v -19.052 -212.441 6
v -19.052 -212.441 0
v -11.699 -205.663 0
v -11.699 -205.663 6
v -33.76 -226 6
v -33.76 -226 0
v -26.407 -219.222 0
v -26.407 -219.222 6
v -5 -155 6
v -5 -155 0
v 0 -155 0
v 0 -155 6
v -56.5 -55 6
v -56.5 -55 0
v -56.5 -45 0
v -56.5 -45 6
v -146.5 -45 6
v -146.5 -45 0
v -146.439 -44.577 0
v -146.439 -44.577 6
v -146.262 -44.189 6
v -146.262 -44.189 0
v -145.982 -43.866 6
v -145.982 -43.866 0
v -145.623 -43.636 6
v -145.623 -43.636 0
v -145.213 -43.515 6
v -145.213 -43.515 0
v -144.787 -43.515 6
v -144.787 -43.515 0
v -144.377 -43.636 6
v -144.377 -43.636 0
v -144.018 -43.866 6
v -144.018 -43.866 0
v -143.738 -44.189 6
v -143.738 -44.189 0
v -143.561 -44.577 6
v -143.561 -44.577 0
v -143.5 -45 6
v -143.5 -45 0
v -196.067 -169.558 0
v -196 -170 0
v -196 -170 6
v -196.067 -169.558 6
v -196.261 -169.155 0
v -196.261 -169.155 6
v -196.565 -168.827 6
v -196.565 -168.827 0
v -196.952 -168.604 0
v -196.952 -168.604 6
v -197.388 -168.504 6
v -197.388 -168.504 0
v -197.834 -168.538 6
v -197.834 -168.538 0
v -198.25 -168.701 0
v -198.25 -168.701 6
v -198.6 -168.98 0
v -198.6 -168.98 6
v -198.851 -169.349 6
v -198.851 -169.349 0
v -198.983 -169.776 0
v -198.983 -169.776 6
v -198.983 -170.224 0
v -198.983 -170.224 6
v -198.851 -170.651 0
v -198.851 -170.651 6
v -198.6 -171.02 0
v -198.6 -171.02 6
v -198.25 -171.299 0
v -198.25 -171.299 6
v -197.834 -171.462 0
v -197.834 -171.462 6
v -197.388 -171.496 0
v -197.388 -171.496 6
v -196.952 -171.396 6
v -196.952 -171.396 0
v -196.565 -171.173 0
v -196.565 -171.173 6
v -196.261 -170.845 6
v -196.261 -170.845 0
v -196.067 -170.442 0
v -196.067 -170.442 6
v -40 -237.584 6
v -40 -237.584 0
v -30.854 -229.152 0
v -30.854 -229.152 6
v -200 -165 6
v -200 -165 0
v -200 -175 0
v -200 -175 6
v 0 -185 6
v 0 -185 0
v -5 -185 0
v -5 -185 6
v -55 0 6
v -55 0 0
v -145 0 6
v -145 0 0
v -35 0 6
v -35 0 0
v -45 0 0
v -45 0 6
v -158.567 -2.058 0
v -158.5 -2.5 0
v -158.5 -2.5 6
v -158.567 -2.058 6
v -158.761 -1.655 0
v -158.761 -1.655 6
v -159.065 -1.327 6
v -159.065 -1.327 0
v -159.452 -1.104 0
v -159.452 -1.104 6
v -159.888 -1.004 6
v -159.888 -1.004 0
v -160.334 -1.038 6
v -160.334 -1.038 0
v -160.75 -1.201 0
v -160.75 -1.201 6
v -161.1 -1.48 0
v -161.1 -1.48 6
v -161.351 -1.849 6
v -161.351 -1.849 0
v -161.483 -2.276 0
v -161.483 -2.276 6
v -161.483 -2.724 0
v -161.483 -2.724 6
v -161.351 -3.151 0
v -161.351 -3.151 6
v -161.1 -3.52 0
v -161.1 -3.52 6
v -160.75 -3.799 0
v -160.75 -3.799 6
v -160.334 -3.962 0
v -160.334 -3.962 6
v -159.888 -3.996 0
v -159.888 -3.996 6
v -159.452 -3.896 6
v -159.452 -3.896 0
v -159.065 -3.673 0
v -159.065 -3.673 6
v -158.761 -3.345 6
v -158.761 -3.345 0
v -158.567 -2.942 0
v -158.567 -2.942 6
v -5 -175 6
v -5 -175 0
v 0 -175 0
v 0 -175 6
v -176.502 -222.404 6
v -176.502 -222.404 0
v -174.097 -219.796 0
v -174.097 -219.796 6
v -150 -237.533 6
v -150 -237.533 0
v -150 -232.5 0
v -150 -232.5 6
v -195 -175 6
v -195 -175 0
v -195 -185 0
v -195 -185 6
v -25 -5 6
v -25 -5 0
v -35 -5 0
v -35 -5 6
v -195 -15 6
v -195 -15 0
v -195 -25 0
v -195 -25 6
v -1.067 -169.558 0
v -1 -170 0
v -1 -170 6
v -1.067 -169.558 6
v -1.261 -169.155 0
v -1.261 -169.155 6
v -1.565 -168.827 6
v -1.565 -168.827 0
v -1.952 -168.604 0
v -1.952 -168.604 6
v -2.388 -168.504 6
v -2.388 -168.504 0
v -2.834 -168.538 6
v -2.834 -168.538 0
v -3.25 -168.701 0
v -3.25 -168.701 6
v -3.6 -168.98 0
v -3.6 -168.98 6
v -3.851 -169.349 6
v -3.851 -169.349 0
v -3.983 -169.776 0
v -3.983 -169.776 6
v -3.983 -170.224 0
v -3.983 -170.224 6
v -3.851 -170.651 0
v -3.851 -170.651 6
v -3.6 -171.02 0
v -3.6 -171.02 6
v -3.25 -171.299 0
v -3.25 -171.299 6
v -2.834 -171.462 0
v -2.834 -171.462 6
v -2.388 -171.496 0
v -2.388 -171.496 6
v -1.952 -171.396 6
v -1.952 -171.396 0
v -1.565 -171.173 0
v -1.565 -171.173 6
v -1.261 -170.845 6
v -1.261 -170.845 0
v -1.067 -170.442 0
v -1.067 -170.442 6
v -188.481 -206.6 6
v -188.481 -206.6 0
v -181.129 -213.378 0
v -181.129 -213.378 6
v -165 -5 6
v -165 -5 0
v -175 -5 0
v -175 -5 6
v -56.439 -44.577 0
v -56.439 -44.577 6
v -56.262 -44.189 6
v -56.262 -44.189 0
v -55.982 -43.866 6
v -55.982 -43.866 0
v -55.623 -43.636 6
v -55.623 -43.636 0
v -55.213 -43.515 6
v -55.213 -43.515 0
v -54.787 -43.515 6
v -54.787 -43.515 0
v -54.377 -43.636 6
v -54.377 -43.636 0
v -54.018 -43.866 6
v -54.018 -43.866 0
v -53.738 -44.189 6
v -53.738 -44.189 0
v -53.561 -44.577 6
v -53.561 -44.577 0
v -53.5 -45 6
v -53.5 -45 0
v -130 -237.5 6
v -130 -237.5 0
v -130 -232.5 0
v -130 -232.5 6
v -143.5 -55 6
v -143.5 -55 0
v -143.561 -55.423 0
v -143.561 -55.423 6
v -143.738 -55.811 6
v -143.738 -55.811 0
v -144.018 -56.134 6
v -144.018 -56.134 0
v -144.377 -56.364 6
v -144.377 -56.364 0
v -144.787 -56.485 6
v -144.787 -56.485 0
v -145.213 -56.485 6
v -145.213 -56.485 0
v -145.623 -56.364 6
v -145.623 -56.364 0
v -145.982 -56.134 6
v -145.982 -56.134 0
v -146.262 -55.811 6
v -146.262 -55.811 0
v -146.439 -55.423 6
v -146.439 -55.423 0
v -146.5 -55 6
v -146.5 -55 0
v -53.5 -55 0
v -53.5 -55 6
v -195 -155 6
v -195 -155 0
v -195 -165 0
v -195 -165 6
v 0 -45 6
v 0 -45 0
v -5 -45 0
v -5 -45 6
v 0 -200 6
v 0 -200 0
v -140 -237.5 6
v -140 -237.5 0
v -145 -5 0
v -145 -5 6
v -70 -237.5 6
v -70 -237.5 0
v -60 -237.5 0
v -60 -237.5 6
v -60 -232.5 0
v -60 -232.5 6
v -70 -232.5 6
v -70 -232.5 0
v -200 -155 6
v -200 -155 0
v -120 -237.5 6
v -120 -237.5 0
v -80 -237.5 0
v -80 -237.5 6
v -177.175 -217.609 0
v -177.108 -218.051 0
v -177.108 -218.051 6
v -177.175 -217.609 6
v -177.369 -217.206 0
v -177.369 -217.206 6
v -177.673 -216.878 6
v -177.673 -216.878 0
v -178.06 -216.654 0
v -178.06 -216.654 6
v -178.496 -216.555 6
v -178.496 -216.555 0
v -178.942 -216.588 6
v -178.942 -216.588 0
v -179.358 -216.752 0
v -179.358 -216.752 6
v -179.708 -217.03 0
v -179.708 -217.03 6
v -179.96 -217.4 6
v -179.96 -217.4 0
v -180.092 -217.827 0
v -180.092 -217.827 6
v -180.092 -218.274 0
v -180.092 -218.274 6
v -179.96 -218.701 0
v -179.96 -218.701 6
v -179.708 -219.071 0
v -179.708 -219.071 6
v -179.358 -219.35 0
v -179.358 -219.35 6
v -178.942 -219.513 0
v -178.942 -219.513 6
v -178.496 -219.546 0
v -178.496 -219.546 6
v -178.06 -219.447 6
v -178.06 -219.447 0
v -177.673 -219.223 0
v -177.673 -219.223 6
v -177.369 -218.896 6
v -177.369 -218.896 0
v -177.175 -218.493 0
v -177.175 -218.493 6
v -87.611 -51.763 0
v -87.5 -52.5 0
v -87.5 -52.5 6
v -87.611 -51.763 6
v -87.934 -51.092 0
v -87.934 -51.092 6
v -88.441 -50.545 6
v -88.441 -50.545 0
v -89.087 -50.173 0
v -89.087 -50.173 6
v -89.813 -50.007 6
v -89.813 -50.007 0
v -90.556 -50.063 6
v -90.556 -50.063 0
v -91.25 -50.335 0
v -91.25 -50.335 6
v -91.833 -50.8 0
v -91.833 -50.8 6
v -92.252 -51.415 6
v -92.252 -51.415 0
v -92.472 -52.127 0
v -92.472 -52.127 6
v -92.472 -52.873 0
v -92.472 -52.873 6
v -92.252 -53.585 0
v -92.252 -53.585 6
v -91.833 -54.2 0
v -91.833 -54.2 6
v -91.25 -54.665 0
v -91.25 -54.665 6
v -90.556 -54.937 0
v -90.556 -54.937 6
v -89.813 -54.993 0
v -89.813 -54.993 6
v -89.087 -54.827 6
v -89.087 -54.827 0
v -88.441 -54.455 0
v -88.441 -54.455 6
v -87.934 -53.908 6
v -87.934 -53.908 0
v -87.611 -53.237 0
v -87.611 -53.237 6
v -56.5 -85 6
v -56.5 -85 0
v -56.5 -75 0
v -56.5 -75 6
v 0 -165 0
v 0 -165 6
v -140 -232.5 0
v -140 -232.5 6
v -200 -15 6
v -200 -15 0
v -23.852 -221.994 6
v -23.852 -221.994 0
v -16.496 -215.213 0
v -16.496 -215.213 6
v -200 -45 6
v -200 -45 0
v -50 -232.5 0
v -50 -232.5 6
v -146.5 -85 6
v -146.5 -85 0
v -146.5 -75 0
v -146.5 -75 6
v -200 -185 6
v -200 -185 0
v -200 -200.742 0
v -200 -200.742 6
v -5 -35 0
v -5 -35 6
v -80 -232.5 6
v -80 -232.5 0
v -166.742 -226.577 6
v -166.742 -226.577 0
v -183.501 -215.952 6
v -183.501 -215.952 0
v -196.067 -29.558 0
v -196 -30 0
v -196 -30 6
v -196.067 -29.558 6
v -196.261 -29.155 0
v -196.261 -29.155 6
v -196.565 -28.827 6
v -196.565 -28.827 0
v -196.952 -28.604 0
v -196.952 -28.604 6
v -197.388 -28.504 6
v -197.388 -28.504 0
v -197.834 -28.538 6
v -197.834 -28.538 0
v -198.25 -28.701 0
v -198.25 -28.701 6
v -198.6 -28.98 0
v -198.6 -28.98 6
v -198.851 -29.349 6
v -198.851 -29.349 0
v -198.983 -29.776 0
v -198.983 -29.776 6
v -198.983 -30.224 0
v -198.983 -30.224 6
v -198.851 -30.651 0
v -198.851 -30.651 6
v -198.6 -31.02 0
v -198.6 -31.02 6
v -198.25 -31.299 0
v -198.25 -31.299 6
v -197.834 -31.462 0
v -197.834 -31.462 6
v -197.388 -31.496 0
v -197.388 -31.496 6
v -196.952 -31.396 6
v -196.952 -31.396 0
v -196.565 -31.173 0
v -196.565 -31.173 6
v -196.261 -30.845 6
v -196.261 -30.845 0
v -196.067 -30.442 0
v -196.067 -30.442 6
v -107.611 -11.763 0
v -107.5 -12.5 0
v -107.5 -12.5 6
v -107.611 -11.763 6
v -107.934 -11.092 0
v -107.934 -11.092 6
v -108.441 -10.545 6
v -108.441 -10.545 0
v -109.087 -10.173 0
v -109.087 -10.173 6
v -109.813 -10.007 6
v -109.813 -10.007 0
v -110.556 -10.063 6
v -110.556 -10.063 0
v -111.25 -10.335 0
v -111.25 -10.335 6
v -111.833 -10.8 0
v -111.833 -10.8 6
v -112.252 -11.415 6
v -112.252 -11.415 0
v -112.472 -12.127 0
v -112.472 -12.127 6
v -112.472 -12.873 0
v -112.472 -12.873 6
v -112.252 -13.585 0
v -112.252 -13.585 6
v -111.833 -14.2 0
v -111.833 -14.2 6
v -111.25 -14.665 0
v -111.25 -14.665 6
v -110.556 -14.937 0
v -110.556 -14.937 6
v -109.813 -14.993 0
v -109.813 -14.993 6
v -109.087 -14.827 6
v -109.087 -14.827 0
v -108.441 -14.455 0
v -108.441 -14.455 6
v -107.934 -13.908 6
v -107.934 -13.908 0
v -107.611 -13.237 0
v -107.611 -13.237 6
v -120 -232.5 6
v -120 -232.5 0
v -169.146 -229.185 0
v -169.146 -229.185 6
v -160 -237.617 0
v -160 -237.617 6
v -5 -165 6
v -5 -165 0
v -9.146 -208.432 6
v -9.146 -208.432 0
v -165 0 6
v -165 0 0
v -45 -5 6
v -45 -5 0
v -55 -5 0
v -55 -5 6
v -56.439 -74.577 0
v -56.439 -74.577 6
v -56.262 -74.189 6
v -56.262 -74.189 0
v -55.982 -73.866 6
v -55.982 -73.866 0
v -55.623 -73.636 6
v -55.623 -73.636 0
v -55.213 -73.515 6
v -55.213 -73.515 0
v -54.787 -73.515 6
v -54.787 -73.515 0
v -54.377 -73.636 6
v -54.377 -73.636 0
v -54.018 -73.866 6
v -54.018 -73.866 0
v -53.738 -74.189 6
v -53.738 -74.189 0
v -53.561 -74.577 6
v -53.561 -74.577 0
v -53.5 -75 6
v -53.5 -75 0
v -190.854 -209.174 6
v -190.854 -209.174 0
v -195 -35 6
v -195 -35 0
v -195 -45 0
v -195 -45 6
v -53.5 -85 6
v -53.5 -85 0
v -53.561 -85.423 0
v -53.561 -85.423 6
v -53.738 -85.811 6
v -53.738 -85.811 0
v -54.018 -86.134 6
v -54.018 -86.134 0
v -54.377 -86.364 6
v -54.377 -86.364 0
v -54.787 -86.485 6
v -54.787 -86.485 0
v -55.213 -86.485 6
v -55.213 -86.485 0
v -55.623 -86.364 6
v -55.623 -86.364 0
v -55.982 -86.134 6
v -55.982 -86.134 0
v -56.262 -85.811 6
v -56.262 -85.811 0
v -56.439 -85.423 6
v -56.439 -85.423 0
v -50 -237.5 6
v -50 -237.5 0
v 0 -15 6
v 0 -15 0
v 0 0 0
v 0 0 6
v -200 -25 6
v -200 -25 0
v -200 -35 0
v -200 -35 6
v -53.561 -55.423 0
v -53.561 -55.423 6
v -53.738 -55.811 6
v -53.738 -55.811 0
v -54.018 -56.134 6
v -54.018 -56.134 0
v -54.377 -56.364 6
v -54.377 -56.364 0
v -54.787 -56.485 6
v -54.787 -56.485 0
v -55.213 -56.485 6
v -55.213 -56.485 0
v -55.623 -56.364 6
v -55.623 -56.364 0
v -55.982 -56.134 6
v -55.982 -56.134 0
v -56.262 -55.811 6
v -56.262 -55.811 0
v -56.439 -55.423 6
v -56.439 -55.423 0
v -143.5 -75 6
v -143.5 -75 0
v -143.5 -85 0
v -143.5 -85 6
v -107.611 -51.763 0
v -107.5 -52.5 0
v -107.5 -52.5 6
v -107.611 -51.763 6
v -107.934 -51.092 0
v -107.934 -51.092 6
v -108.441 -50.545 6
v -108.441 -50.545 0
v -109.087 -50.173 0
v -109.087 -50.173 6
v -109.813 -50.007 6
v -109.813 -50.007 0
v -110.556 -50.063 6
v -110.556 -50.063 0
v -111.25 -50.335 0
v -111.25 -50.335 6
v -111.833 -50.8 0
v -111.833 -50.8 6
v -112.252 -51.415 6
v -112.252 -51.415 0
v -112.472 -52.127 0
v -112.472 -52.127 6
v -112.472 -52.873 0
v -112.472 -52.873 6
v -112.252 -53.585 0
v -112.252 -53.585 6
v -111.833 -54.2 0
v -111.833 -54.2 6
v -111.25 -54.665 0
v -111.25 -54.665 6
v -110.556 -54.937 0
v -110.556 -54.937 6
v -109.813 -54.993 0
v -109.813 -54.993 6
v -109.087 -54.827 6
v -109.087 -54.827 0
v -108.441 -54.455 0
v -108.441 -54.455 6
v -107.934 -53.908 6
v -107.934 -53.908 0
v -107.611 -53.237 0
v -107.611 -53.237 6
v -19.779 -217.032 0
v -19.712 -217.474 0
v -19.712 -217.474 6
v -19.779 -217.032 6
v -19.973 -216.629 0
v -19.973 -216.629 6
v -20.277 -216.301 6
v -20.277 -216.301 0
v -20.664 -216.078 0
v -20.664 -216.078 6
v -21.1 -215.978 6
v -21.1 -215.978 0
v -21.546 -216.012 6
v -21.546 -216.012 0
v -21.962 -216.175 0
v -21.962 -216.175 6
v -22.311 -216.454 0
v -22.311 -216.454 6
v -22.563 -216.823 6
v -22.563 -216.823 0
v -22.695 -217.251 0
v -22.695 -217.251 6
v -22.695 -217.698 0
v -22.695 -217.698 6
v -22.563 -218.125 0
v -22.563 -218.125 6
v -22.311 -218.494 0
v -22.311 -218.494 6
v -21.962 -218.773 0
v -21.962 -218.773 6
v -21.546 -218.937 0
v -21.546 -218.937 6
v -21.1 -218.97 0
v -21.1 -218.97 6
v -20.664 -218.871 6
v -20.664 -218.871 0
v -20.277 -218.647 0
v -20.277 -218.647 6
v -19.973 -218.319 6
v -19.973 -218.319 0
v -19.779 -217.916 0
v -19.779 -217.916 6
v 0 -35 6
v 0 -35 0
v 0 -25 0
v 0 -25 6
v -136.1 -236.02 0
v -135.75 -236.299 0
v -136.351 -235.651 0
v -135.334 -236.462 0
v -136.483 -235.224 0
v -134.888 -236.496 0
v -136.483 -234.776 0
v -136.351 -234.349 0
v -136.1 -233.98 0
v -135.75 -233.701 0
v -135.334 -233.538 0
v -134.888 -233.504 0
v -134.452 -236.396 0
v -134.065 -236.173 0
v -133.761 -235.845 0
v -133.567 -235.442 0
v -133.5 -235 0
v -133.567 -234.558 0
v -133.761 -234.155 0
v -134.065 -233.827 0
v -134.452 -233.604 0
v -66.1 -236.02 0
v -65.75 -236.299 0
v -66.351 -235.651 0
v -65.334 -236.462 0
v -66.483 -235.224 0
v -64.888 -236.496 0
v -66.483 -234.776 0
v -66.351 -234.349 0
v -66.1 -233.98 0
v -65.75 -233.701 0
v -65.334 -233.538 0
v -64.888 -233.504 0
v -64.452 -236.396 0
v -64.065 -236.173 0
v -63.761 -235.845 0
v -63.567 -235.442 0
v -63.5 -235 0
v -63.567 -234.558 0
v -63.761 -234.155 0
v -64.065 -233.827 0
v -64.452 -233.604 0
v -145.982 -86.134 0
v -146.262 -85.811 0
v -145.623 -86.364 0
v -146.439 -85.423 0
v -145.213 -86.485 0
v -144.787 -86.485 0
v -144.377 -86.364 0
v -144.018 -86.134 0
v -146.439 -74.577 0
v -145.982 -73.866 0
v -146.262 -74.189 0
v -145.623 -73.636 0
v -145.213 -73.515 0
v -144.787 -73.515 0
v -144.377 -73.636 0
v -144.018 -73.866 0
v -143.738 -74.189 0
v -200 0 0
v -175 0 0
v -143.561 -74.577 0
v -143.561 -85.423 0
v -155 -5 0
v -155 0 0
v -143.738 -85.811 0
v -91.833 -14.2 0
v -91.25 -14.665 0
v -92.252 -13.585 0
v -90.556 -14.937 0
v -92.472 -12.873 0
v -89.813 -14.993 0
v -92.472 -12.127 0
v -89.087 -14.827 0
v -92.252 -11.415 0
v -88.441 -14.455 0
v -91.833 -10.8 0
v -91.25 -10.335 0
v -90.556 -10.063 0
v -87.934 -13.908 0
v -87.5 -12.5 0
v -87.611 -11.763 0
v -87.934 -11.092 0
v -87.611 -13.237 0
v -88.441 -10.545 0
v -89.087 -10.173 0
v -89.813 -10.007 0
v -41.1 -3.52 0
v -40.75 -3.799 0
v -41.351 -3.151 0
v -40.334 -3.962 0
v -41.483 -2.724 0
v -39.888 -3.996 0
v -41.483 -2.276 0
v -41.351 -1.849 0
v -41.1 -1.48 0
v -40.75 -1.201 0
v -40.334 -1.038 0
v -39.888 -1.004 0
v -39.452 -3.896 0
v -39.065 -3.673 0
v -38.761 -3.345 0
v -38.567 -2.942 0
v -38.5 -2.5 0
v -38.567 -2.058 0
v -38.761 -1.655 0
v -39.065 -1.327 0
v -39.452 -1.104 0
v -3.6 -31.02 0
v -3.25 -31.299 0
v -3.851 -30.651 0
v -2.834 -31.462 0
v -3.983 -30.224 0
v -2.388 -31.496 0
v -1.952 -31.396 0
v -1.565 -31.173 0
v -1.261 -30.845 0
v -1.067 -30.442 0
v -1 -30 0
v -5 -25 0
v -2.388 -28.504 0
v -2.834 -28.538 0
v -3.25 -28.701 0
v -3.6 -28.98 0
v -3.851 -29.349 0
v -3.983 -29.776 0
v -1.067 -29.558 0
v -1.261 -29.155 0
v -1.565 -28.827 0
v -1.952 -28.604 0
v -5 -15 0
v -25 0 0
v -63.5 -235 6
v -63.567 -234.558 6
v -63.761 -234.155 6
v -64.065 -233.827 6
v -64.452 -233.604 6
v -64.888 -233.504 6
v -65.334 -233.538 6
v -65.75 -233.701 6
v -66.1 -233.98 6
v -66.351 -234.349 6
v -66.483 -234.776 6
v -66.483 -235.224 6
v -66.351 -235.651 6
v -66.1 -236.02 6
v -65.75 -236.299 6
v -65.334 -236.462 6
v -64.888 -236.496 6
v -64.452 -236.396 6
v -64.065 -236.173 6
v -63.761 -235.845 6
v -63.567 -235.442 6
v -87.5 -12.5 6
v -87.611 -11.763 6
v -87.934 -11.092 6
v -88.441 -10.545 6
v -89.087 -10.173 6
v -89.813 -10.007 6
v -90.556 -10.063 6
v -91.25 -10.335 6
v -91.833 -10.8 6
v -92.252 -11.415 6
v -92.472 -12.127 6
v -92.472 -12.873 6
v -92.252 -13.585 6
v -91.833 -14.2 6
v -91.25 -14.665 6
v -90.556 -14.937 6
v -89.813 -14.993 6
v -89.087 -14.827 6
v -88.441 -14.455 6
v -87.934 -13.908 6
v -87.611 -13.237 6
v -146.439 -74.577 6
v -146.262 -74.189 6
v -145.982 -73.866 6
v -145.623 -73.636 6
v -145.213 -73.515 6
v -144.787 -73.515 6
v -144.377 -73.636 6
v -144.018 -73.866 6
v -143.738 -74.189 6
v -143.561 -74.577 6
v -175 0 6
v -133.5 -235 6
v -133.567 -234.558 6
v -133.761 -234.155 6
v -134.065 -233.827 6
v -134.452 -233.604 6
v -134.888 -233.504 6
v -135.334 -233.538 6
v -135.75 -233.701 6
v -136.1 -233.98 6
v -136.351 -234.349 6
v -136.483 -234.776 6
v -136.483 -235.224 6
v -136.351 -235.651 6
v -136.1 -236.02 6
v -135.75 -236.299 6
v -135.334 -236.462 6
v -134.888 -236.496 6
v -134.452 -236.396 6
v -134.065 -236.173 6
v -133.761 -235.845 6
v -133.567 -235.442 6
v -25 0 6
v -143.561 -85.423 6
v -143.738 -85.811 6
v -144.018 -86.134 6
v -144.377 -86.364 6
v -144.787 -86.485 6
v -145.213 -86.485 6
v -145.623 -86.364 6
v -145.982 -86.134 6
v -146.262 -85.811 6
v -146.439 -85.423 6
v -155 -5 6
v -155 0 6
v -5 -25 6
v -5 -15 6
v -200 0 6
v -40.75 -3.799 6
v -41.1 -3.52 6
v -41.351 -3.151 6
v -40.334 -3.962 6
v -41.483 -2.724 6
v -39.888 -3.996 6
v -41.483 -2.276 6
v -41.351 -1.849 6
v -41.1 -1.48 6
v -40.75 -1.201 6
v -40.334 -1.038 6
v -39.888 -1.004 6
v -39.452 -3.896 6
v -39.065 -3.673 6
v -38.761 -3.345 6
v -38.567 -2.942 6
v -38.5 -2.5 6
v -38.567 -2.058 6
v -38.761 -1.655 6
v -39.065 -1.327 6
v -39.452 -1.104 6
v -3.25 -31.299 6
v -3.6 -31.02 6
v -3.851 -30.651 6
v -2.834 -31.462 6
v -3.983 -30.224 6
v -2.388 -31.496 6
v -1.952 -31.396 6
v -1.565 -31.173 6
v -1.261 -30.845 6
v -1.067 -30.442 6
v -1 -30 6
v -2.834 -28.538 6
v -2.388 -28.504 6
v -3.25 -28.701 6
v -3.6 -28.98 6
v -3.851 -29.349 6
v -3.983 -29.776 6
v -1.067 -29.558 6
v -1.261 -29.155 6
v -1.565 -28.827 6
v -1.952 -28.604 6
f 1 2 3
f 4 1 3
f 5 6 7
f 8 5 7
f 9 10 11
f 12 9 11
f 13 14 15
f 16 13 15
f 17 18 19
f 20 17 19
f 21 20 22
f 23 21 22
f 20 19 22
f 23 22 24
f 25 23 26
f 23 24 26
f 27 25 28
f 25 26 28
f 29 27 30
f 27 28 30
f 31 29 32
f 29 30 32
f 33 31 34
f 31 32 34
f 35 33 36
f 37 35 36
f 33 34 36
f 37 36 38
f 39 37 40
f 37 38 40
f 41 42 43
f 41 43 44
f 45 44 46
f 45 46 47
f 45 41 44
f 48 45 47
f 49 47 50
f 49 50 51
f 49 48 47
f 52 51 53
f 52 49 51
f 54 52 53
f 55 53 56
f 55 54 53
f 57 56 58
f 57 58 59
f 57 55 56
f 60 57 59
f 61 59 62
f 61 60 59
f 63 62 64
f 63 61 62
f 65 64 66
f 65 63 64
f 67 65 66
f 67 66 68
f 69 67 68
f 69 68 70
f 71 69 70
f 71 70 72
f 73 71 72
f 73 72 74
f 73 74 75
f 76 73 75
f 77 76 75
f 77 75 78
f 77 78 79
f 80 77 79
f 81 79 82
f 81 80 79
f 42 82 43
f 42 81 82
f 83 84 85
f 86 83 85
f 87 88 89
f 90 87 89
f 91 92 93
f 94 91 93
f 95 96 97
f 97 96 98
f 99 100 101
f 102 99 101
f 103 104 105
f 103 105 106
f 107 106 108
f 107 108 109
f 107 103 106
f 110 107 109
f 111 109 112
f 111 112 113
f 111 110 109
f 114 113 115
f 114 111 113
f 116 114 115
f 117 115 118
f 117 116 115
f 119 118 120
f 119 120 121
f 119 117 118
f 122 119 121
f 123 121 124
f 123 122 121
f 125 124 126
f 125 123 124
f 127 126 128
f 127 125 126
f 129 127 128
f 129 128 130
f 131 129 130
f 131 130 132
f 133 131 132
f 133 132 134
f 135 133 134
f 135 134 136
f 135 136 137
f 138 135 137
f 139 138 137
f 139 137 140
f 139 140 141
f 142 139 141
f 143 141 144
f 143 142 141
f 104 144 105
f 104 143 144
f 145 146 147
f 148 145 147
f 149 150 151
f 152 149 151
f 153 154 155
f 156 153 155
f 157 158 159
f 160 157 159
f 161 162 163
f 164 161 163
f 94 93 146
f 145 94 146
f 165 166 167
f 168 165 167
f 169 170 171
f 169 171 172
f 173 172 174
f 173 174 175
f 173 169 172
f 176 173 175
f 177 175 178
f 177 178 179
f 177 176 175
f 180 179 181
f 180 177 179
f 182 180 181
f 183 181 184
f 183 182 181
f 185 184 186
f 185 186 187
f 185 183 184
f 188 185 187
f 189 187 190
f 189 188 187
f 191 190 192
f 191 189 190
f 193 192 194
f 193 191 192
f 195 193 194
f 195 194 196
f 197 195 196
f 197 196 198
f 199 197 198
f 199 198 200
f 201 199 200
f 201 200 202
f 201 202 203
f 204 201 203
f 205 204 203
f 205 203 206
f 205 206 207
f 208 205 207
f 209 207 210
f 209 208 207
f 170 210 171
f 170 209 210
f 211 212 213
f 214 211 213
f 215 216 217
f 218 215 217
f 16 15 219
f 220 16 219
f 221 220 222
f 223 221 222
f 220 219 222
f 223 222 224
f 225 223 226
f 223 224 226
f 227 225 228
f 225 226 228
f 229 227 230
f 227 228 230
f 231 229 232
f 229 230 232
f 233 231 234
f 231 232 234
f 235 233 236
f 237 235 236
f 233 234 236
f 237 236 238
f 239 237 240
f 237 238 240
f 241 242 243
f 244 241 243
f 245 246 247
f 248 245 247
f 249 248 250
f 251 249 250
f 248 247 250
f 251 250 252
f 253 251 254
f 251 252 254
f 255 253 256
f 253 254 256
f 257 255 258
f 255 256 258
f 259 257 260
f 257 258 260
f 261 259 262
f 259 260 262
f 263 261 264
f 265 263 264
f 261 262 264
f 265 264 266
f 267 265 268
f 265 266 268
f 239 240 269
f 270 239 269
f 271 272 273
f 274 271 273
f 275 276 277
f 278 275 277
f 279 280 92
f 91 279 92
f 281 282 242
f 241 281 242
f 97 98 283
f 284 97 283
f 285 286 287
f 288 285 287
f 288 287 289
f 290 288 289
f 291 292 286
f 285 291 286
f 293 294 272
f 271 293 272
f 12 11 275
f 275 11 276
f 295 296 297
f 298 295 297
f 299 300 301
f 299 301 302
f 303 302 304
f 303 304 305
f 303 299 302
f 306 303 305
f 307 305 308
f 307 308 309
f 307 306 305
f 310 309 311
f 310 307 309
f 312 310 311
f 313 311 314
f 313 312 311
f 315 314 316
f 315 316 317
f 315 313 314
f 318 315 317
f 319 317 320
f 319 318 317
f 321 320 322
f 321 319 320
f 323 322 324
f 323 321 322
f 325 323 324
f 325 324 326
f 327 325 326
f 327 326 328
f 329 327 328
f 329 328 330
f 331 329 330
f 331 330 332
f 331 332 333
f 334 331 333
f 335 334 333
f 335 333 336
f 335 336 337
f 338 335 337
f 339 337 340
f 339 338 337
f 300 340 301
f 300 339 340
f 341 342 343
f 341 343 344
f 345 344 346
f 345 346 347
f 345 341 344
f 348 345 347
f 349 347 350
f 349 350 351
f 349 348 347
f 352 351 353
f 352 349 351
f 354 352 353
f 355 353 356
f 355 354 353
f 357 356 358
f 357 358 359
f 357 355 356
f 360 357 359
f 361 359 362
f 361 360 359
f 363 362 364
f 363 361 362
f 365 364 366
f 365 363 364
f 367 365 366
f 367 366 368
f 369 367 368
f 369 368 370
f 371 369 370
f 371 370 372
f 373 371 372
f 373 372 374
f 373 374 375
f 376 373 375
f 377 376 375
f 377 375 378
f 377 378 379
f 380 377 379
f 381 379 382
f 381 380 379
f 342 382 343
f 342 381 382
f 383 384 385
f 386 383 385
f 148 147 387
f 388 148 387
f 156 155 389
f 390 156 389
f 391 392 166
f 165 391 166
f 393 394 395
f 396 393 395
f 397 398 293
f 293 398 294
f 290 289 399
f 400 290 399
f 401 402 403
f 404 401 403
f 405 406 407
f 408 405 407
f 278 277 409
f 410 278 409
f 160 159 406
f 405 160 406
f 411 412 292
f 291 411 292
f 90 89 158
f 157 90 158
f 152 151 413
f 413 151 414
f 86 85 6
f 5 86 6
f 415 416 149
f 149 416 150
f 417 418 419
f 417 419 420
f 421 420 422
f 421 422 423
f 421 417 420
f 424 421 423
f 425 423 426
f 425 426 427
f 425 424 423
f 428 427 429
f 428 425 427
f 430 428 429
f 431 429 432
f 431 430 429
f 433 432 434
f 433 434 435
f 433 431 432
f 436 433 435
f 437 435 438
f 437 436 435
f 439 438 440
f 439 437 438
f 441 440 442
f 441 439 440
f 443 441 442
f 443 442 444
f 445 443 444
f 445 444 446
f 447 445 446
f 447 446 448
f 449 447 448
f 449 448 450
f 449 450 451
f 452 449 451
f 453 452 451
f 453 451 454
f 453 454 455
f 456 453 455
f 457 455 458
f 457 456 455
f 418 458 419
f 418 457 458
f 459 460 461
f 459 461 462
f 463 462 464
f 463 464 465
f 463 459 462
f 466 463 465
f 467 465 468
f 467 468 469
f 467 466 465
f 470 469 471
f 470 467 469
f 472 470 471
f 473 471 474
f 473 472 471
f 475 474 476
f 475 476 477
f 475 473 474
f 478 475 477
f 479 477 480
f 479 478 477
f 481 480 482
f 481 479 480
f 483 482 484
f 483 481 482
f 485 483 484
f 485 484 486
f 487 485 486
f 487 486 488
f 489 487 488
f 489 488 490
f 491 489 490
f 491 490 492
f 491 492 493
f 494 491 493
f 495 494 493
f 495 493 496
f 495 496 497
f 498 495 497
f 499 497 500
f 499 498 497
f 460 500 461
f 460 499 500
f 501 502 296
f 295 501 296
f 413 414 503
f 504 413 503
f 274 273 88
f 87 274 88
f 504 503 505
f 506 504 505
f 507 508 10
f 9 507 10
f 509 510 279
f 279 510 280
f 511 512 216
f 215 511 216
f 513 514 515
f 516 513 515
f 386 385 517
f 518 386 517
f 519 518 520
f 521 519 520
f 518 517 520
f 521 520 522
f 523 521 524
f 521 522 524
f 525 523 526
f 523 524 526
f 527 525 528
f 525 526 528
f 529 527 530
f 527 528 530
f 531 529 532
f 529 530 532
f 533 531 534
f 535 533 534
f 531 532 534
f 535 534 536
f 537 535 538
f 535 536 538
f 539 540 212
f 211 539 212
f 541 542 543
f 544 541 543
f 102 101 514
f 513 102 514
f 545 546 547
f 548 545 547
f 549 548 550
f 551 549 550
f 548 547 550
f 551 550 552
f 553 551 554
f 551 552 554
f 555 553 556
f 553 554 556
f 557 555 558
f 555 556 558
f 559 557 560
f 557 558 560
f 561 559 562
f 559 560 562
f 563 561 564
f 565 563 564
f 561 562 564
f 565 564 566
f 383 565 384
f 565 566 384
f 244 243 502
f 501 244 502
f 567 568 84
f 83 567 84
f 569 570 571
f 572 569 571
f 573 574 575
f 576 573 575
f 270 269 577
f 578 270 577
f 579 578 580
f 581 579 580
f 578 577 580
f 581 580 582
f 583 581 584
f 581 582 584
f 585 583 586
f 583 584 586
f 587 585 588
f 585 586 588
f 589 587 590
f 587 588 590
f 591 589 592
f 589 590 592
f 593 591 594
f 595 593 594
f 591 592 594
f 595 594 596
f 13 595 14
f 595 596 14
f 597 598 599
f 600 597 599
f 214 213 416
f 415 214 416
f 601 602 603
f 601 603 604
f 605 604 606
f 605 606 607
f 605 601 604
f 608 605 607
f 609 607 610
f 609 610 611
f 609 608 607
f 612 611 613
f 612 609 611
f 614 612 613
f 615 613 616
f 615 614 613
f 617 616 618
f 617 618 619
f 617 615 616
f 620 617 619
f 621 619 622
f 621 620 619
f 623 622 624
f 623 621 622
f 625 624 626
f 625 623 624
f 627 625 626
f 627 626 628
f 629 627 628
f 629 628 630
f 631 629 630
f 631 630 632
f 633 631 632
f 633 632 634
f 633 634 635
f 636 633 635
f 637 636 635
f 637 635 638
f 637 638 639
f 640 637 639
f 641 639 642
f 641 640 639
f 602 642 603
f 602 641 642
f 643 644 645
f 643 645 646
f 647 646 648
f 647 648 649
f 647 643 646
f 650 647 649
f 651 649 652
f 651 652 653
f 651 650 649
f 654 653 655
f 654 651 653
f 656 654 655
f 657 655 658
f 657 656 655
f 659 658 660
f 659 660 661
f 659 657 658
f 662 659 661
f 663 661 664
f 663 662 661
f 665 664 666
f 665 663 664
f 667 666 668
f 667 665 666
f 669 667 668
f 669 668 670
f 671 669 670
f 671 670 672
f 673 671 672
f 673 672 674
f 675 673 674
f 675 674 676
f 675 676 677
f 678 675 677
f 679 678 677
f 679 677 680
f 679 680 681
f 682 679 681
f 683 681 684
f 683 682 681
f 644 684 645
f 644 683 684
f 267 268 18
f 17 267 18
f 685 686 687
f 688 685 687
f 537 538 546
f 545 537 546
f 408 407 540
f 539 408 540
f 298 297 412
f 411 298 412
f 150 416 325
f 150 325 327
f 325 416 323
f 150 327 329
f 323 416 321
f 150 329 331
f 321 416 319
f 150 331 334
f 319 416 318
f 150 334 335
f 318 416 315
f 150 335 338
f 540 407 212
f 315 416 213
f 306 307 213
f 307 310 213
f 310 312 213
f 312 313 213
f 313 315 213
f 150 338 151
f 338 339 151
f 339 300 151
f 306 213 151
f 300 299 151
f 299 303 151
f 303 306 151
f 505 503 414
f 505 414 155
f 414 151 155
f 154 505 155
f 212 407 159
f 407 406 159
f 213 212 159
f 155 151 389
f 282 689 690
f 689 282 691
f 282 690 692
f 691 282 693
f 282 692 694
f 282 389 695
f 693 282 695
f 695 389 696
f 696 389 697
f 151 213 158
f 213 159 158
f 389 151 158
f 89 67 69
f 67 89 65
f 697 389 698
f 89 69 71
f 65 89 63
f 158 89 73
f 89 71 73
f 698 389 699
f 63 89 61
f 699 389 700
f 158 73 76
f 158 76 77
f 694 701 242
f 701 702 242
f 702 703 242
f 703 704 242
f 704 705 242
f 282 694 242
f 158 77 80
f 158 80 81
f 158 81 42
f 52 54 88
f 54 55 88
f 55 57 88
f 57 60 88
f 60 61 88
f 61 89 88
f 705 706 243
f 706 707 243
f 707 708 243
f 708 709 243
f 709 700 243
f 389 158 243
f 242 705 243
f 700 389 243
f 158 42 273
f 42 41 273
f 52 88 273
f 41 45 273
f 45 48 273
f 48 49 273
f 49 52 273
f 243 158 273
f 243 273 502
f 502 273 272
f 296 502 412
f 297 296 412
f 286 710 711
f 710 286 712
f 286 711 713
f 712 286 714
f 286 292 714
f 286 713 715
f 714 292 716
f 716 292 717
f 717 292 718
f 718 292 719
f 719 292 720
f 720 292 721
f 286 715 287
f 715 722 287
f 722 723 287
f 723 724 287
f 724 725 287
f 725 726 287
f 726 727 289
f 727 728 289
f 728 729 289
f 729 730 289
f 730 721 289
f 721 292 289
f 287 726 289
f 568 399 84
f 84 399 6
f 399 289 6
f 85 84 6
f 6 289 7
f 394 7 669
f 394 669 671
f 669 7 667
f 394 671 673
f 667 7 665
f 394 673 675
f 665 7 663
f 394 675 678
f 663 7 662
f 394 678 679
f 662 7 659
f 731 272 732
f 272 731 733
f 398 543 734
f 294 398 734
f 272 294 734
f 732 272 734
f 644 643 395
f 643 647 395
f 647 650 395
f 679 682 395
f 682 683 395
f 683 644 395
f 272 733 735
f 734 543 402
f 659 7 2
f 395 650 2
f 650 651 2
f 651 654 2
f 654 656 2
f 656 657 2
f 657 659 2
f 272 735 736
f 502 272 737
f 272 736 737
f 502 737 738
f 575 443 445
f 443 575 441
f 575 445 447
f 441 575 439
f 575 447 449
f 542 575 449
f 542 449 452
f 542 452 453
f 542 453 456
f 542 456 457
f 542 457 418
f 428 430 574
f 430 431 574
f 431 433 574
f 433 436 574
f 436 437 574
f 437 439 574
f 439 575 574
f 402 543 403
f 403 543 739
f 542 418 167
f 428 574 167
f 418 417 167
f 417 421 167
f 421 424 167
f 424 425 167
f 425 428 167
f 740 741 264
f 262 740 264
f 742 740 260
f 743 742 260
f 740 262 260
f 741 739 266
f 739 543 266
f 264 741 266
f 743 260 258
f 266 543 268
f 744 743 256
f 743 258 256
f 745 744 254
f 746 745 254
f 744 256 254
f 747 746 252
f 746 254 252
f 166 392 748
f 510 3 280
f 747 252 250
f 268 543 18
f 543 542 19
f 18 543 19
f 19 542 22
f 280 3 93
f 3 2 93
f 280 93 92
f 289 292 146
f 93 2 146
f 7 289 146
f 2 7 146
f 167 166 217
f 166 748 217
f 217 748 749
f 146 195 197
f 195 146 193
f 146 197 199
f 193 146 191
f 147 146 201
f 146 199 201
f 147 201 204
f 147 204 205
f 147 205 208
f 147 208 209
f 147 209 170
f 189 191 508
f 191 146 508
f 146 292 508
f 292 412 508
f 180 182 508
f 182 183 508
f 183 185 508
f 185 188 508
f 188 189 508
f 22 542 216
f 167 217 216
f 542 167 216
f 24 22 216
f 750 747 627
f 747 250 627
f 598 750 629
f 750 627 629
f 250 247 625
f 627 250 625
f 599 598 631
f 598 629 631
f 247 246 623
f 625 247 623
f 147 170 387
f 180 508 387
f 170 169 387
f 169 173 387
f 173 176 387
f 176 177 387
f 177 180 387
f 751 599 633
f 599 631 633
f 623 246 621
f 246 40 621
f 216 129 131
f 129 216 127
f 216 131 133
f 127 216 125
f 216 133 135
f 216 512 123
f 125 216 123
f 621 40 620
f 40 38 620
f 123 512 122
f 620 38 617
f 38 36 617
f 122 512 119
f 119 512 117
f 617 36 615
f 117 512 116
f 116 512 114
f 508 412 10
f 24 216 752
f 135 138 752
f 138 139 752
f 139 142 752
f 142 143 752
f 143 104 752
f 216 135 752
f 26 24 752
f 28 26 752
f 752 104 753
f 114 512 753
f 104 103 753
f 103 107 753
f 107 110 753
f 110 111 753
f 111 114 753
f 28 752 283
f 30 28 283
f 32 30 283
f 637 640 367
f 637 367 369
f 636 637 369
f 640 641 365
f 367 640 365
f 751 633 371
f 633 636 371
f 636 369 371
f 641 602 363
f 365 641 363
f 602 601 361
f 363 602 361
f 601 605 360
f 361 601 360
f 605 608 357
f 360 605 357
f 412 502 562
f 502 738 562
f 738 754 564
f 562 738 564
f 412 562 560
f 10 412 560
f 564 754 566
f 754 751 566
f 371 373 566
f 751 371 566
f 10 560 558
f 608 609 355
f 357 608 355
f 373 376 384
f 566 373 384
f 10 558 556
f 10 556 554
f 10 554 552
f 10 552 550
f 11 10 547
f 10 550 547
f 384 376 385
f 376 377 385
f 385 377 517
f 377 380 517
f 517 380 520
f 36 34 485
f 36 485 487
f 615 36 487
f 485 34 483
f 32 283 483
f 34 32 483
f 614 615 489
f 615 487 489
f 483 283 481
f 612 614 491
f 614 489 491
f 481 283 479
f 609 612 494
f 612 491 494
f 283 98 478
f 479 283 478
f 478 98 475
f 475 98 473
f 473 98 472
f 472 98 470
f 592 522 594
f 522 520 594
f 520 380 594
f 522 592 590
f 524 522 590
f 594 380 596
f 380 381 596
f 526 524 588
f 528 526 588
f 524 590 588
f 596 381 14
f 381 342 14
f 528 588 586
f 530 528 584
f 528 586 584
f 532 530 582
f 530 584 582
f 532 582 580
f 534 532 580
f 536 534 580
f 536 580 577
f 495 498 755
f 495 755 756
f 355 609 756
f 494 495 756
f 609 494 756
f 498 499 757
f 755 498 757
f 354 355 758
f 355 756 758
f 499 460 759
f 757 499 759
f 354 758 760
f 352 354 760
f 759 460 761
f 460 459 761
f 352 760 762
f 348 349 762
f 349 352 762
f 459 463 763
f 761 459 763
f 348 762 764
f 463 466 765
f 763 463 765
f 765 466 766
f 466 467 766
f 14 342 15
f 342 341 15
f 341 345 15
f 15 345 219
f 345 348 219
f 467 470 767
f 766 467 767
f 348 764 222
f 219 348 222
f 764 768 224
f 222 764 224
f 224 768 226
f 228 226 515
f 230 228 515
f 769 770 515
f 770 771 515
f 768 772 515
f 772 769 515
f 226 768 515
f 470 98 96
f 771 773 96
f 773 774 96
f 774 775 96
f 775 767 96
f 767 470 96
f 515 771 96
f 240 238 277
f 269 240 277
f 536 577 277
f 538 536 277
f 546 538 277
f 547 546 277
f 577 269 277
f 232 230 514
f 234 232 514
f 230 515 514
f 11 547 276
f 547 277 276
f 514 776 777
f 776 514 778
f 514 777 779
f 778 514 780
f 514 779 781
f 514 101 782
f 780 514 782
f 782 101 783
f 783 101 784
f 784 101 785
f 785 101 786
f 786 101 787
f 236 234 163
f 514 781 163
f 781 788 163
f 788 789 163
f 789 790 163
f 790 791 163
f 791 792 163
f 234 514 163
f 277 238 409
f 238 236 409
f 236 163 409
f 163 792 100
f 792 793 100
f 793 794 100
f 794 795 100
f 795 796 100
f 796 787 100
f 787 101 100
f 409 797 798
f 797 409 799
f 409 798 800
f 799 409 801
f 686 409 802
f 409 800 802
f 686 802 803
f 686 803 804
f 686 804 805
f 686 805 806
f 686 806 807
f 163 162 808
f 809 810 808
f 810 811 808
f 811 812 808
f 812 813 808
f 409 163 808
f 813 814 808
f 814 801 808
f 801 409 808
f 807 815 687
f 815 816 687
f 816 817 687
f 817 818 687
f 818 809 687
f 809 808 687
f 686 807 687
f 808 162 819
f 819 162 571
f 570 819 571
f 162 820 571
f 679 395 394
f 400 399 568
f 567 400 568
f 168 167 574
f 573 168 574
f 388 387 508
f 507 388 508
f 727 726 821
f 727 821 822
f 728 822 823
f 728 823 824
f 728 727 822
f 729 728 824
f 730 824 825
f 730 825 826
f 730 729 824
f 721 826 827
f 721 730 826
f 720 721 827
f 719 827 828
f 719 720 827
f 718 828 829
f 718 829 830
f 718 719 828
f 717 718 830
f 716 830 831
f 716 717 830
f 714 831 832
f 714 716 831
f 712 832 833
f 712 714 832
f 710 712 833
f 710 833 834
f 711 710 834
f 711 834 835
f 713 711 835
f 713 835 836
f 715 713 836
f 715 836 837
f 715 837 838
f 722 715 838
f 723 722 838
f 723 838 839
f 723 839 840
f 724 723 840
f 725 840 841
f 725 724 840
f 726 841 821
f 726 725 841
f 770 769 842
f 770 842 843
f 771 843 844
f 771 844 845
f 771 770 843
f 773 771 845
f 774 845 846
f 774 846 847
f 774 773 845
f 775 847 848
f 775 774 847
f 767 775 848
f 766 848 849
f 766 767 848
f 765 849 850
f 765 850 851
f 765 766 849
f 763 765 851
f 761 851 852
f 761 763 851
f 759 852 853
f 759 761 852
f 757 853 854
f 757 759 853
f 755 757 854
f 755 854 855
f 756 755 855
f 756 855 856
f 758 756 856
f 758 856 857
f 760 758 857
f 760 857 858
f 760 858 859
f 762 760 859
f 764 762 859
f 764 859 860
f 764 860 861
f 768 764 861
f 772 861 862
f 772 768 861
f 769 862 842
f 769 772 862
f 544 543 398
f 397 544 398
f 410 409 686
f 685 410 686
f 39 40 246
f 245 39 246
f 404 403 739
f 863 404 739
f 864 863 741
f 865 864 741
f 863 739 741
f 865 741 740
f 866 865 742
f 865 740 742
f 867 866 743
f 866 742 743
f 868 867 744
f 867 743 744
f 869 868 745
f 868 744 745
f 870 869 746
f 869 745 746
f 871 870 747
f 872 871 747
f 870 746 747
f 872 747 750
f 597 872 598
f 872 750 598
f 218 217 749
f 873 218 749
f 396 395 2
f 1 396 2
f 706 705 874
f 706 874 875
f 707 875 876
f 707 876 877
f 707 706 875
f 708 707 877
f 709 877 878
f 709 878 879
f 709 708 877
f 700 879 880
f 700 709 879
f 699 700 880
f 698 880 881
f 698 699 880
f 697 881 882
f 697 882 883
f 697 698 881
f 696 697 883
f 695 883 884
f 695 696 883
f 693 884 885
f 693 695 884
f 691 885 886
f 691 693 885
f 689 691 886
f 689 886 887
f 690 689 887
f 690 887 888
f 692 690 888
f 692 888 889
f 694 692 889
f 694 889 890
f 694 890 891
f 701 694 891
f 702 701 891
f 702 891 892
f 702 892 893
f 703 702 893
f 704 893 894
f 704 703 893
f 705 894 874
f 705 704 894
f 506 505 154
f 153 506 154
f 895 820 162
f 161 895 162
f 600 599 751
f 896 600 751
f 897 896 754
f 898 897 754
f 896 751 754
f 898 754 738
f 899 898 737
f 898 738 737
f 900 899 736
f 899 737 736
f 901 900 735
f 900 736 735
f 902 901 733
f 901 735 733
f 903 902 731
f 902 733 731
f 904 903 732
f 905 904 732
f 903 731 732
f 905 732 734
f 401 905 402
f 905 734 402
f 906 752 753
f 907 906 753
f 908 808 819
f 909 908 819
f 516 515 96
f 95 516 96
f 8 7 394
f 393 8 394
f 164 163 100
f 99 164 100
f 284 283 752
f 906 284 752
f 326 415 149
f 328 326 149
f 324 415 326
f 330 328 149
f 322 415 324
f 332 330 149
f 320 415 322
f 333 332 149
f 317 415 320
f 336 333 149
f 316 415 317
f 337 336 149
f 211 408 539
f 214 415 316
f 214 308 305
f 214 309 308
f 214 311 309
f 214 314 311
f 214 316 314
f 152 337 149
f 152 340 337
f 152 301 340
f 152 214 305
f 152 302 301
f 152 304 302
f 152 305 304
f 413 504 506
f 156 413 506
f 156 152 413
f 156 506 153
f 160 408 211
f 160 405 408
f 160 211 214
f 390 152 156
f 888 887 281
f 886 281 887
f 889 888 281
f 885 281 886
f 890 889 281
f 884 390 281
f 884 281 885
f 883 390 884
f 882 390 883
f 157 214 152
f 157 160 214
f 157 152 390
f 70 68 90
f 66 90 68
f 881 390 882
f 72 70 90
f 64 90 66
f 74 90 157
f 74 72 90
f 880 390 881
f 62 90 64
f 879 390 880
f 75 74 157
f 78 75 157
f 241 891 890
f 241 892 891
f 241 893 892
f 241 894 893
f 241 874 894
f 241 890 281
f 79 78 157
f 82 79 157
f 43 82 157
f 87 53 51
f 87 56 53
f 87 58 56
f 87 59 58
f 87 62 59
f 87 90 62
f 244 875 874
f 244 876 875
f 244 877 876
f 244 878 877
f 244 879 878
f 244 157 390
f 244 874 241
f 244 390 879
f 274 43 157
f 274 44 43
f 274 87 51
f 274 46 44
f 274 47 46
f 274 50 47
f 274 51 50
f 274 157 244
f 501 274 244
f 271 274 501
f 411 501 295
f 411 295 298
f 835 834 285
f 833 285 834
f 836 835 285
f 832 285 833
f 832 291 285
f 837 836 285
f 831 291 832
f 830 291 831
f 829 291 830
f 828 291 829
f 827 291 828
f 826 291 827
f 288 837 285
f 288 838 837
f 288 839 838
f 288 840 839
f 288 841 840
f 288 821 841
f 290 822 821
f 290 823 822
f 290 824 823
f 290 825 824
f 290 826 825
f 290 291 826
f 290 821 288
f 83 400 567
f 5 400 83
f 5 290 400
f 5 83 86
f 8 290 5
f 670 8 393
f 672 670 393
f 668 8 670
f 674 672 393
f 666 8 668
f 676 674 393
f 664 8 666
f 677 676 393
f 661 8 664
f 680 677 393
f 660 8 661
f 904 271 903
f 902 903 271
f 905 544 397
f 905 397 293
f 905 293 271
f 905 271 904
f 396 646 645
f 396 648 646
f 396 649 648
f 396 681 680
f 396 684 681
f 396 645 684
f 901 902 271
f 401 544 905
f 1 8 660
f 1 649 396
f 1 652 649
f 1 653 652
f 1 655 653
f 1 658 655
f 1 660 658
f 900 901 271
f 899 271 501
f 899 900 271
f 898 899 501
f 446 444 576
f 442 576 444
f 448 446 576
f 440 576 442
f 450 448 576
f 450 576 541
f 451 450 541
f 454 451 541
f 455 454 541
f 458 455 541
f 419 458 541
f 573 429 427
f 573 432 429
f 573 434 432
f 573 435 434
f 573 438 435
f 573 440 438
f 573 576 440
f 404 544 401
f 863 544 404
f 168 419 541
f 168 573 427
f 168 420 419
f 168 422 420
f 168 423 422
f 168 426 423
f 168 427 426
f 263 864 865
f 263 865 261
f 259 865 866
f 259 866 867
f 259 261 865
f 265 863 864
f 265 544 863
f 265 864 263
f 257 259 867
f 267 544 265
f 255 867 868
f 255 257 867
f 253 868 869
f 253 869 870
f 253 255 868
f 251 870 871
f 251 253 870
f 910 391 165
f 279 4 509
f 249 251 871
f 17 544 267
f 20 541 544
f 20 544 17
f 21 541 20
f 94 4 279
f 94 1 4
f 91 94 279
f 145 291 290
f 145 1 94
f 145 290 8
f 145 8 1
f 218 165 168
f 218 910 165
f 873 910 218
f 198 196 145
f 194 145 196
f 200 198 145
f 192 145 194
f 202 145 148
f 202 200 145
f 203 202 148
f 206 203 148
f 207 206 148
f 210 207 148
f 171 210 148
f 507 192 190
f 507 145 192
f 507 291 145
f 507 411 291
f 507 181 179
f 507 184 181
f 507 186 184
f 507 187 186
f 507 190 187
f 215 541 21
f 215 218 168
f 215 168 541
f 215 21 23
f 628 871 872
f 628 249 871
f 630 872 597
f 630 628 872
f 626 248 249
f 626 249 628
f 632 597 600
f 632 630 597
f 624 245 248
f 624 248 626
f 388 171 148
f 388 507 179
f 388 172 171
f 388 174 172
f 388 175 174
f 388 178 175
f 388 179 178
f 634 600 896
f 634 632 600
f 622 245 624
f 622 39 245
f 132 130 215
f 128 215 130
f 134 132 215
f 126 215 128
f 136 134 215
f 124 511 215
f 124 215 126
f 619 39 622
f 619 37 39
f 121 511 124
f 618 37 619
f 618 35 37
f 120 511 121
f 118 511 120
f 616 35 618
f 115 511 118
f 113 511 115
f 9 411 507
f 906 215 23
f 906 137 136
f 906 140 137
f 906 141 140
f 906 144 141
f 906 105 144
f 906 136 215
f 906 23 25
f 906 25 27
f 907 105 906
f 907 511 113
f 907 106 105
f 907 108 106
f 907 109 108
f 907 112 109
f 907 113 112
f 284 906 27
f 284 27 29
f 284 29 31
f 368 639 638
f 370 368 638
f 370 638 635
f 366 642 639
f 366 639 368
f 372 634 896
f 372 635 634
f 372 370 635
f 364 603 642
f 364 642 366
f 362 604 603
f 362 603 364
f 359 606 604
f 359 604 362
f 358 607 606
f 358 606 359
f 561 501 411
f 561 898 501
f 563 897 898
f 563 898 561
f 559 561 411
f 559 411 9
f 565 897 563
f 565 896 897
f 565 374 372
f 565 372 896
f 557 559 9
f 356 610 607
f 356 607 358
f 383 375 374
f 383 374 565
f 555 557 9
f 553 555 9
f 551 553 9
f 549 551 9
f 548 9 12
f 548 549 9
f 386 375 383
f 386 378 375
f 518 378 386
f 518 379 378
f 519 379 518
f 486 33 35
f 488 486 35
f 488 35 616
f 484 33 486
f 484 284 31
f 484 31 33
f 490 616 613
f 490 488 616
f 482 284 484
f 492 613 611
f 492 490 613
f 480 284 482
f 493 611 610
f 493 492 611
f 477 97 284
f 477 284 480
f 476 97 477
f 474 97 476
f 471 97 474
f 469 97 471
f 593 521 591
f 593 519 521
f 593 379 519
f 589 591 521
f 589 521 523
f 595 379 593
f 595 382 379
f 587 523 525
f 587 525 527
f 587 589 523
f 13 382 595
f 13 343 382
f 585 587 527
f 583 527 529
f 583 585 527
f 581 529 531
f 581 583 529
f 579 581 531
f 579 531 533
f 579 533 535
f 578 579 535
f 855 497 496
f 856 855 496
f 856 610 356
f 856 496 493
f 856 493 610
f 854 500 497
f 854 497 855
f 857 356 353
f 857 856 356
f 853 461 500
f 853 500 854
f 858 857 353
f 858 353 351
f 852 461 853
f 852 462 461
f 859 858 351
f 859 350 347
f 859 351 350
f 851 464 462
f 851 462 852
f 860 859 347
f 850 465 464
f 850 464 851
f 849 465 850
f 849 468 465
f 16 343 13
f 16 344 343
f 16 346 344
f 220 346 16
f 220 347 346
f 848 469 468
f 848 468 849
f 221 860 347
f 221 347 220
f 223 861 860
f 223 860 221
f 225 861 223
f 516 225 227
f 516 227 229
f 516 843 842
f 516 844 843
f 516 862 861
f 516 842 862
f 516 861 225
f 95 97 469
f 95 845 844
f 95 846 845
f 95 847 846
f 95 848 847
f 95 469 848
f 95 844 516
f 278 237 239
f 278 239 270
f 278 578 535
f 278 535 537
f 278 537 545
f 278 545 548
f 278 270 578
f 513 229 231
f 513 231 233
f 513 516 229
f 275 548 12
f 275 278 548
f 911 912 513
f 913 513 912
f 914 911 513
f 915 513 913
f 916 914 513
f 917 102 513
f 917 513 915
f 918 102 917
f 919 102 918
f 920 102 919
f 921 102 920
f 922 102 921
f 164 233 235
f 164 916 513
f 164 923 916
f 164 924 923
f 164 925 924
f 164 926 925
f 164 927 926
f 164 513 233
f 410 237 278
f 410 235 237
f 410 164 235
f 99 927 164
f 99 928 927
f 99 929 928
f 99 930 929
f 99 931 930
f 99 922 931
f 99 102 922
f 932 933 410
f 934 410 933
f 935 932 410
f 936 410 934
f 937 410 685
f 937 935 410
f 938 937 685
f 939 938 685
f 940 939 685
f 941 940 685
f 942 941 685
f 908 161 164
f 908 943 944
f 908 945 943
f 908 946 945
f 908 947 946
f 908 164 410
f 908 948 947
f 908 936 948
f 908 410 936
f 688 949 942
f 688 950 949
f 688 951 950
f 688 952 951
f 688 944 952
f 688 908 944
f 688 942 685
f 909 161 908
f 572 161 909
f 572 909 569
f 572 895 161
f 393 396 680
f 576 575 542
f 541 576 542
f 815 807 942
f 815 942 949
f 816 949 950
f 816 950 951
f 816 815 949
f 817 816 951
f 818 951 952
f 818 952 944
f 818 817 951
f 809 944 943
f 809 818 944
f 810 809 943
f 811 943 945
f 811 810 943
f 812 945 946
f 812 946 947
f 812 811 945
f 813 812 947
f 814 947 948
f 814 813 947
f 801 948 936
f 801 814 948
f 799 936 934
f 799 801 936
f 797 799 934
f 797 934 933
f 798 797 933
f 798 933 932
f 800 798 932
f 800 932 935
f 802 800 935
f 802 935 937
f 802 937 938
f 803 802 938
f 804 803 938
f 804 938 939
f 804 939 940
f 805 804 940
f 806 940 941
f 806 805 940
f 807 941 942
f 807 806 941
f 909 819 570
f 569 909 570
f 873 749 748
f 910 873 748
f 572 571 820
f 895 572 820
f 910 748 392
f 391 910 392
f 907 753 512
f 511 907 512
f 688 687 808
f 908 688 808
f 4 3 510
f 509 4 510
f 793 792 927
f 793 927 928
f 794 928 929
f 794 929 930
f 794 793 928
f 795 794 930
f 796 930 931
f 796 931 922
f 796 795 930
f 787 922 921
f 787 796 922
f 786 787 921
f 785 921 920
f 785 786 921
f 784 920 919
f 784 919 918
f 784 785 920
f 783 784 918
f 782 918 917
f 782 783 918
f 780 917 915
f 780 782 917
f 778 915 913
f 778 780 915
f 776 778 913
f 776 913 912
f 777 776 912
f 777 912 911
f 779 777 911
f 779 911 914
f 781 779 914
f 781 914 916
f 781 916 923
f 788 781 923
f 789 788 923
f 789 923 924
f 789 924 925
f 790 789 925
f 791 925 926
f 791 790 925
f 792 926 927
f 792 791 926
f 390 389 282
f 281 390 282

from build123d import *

# Parameters (mm, degrees)
MODEL_R                  = 1.5
MODEL_R_2                = 2.5
RESSALTO_EXTRUS_O1_DEPTH = 6


with BuildPart() as part:
    # Model → Ressalto-extrusão1 (new body)
    with BuildSketch(Plane.XY):
        Polygon((-5, -175), (0, -175), (0, -165), (-5, -165), (-5, -155), (0, -155), (0, -45), (-5, -45), (-5, -35), (0, -35), (0, -25), (-5, -25), (-5, -15), (0, -15), (0, 0), (-25, 0), (-25, -5), (-35, -5), (-35, 0), (-45, 0), (-45, -5), (-55, -5), (-55, 0), (-145, 0), (-145, -5), (-155, -5), (-155, 0), (-165, 0), (-165, -5), (-175, -5), (-175, 0), (-200, 0), (-200, -15), (-195, -15), (-195, -25), (-200, -25), (-200, -35), (-195, -35), (-195, -45), (-200, -45), (-200, -155), (-195, -155), (-195, -165), (-200, -165), (-200, -175), (-195, -175), (-195, -185), (-200, -185), (-200, -200.74174754), (-190.853525683, -209.17356867), (-188.481322389, -206.600305295), (-181.128851073, -213.378296557), (-183.501054367, -215.951559933), (-176.501501675, -222.404207614), (-174.096972592, -219.795878624), (-166.741593597, -226.576550376), (-169.14612268, -229.184879366), (-159.999648363, -237.616700496), (-150, -237.53283976), (-150, -232.5), (-140, -232.5), (-140, -237.5), (-130, -237.5), (-130, -232.5), (-120, -232.5), (-120, -237.5), (-80, -237.5), (-80, -232.5), (-70, -232.5), (-70, -237.5), (-60, -237.5), (-60, -232.5), (-50, -232.5), (-50, -237.5), (-40.000351637, -237.583860737), (-30.85387732, -229.152039608), (-33.759891511, -225.999721294), (-26.407420195, -219.221730032), (-23.852117489, -221.993611718), (-16.496373021, -215.21260305), (-19.051675727, -212.440721364), (-11.69920441, -205.662730102), (-9.146474317, -208.43182113), (0, -200), (0, -185), (-5, -185), align=None)
        with Locations((-2.5, -170)):
            Circle(MODEL_R, mode=Mode.SUBTRACT)
        with Locations((-2.5, -30)):
            Circle(MODEL_R, mode=Mode.SUBTRACT)
        with Locations((-40, -2.5)):
            Circle(MODEL_R, mode=Mode.SUBTRACT)
        with Locations((-160, -2.5)):
            Circle(MODEL_R, mode=Mode.SUBTRACT)
        with Locations((-197.5, -30)):
            Circle(MODEL_R, mode=Mode.SUBTRACT)
        with Locations((-197.5, -170)):
            Circle(MODEL_R, mode=Mode.SUBTRACT)
        with Locations((-65, -235)):
            Circle(MODEL_R, mode=Mode.SUBTRACT)
        with Locations((-135, -235)):
            Circle(MODEL_R, mode=Mode.SUBTRACT)
        with Locations((-90, -52.5)):
            Circle(MODEL_R_2, mode=Mode.SUBTRACT)
        with Locations((-110, -12.5)):
            Circle(MODEL_R_2, mode=Mode.SUBTRACT)
        with Locations((-90, -12.5)):
            Circle(MODEL_R_2, mode=Mode.SUBTRACT)
        with Locations((-110, -52.5)):
            Circle(MODEL_R_2, mode=Mode.SUBTRACT)
        with Locations((-178.608483127, -218.05063468)):
            Circle(MODEL_R, mode=Mode.SUBTRACT)
        with Locations((-21.21191866, -217.474200234)):
            Circle(MODEL_R, mode=Mode.SUBTRACT)
        with BuildLine():
            Line((-56.5, -55), (-56.5, -45))
            ThreePointArc((-56.5, -45), (-55, -43.5), (-53.5, -45))
            Line((-53.5, -45), (-53.5, -55))
            ThreePointArc((-53.5, -55), (-55, -56.5), (-56.5, -55))
        make_face(mode=Mode.SUBTRACT)
        with BuildLine():
            Line((-53.5, -75), (-53.5, -85))
            ThreePointArc((-53.5, -85), (-55, -86.5), (-56.5, -85))
            Line((-56.5, -85), (-56.5, -75))
            ThreePointArc((-56.5, -75), (-55, -73.5), (-53.5, -75))
        make_face(mode=Mode.SUBTRACT)
        with BuildLine():
            Line((-146.5, -85), (-146.5, -75))
            ThreePointArc((-146.5, -75), (-145, -73.5), (-143.5, -75))
            Line((-143.5, -75), (-143.5, -85))
            ThreePointArc((-143.5, -85), (-145, -86.5), (-146.5, -85))
        make_face(mode=Mode.SUBTRACT)
        with BuildLine():
            Line((-146.5, -55), (-146.5, -45))
            ThreePointArc((-146.5, -45), (-145, -43.5), (-143.5, -45))
            Line((-143.5, -45), (-143.5, -55))
            ThreePointArc((-143.5, -55), (-145, -56.5), (-146.5, -55))
        make_face(mode=Mode.SUBTRACT)
    extrude(amount=RESSALTO_EXTRUS_O1_DEPTH)


solid = part.part
